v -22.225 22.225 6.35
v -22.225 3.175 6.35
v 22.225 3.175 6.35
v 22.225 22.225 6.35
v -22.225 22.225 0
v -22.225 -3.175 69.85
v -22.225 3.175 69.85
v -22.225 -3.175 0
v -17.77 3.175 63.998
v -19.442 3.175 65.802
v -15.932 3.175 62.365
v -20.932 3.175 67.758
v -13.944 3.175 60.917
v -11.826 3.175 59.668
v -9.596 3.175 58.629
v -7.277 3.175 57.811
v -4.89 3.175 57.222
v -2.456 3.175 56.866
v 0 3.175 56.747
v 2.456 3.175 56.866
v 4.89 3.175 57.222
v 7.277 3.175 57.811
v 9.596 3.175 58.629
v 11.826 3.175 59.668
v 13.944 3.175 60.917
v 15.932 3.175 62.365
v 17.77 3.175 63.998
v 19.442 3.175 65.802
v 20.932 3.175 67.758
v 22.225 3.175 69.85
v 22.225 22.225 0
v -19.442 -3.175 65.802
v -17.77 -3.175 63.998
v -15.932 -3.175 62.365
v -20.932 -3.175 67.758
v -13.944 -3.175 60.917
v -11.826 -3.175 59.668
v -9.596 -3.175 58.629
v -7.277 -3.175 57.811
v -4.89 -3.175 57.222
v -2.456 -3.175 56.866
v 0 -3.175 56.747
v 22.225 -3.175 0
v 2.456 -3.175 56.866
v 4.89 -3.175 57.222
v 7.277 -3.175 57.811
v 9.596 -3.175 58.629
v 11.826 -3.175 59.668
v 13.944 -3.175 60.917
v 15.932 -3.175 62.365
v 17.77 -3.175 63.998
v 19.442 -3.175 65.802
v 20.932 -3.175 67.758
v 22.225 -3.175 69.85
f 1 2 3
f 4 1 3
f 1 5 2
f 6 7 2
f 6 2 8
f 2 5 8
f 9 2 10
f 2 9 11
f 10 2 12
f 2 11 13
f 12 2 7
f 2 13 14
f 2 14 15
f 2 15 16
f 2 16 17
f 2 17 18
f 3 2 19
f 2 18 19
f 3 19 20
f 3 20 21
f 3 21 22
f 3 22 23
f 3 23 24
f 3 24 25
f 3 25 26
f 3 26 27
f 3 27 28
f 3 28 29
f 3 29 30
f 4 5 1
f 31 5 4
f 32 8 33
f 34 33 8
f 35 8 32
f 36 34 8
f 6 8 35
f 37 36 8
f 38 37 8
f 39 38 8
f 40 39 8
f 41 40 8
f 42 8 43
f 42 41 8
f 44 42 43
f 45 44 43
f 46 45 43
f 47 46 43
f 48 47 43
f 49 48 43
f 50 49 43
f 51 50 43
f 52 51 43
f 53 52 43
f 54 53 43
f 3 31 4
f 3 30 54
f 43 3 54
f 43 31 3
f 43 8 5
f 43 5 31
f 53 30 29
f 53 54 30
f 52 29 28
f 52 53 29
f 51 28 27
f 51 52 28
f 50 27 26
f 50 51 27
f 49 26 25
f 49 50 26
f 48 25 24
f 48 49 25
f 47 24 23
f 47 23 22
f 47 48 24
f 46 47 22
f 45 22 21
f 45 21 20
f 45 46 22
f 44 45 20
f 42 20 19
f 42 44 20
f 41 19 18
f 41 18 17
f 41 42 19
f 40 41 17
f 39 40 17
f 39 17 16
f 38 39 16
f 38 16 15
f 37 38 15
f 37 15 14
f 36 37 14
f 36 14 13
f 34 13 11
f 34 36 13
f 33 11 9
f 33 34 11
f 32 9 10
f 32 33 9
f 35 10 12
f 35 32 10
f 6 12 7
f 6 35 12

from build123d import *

# Parameters (mm, degrees)
F1_DEPTH = 3.175
F2_W     = 44.45
F2_H     = 19.05
F3_DEPTH = 6.35


with BuildPart() as f1:
    # F0 (on Front) → F1 (new body, symmetric)
    with BuildSketch(Plane.XZ):
        with BuildLine():
            Line((-22.225, 69.85), (-22.225, 0))
            Line((-22.225, 0), (22.225, 0))
            Line((22.225, 0), (22.225, 69.85))
            ThreePointArc((22.225, 69.85), (0, 56.746722), (-22.225, 69.85))
        make_face()
    extrude(amount=F1_DEPTH, both=True)

    # F2 (on face) → F3 (join)
    with BuildSketch(Plane(origin=(0, 0, 0), x_dir=(1, 0, 0), z_dir=(0, 0, -1))):
        with Locations((0, -12.7)):
            Rectangle(F2_W, F2_H)
    extrude(amount=-F3_DEPTH)


solid = f1.part
